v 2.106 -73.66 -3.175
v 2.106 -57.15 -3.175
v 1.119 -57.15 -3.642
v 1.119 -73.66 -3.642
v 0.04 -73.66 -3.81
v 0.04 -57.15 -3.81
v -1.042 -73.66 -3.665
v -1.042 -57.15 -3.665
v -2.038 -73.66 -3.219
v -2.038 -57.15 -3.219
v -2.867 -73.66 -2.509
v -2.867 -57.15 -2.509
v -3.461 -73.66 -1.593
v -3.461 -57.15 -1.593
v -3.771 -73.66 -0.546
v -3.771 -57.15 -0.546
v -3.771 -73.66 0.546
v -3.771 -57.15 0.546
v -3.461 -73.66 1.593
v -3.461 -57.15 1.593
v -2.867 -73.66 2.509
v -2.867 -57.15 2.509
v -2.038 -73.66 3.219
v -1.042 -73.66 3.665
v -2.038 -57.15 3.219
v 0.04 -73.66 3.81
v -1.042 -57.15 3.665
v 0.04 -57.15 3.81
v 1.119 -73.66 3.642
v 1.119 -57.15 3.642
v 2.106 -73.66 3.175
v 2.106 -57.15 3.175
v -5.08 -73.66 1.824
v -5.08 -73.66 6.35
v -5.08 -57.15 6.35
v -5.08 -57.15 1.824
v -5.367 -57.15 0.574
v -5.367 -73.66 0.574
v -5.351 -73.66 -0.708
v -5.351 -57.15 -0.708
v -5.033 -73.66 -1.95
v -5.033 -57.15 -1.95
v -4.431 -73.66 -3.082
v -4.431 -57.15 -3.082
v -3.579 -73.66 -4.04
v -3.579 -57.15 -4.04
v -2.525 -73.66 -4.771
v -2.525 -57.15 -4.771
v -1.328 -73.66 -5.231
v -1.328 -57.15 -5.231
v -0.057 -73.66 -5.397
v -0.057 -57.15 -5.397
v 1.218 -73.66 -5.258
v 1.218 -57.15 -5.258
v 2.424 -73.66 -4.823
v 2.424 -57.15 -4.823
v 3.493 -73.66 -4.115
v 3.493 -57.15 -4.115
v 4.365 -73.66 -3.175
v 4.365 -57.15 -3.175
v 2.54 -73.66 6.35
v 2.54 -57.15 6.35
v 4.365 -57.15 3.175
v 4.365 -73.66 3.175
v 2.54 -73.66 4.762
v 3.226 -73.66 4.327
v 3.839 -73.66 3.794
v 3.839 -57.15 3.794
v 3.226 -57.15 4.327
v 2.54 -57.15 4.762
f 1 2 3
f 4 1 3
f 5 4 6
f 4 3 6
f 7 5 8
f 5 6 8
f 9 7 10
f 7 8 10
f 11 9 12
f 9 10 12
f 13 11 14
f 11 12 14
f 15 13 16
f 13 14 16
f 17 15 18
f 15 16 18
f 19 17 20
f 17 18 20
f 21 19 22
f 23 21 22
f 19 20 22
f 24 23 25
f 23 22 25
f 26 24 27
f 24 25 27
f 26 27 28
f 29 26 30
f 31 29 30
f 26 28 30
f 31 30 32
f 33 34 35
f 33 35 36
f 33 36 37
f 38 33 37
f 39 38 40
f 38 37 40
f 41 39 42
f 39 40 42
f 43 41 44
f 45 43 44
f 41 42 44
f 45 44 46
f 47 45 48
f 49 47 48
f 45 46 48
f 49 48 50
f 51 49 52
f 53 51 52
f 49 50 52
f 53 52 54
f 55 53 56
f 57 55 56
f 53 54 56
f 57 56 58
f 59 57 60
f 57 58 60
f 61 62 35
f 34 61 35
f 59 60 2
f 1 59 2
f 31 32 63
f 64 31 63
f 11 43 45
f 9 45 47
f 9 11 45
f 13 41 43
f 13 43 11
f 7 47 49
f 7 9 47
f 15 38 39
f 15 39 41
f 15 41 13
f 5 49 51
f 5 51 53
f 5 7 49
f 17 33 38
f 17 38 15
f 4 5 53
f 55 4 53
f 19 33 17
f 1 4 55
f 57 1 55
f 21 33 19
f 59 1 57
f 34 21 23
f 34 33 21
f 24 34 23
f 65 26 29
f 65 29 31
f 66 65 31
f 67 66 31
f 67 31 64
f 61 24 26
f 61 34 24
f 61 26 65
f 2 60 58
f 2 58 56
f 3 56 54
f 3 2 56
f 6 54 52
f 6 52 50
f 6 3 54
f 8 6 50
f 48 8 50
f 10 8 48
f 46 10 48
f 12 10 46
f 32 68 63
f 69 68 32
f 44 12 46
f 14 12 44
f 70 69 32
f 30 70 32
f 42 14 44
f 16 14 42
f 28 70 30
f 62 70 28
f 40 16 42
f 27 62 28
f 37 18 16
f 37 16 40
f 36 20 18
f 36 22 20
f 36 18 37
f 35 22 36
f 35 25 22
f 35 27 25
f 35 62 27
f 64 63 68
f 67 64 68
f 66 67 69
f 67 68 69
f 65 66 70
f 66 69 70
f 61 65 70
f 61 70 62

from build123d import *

# Parameters (mm, degrees)
F1_DEPTH  = 73.66
F3_DEPTH  = 73.66
F4_W      = 25.4
F4_H      = 6.349999
F4_H_2    = 6.35
F5_DEPTH  = 69.85
F6_W      = 12.7
F6_H      = 63.5
F7_DEPTH  = 63.5
F8_W      = 25.4
F8_H      = 82.55
F9_DEPTH  = 57.15
F10_W     = 25.4
F10_H     = 6.349999
F11_DEPTH = 69.851


with BuildPart() as f1:
    # F0 (on Front) → F1 (new body)
    with BuildSketch(Plane.XZ):
        with BuildLine():
            ThreePointArc((2.106057, -3.175), (-3.81, 0), (2.106057, 3.175))
            Line((2.106057, 3.175), (4.364903, 3.175))
            ThreePointArc((4.364903, 3.175), (-5.3975, 0), (4.364903, -3.175))
            Line((4.364903, -3.175), (2.106057, -3.175))
        make_face()
    extrude(amount=F1_DEPTH)

    # F2 (on face) → F3 (join, through all)
    with BuildSketch(Plane.XZ.offset(73.66)):
        with BuildLine():
            Line((-5.08, 6.35), (-5.08, 1.823899))
            ThreePointArc((-5.08, 1.823899), (-1.942098, 5.035997), (2.54, 4.7625))
            Line((2.54, 4.7625), (2.54, 6.35))
            Line((2.54, 6.35), (-5.08, 6.35))
        make_face()
    extrude(amount=-F3_DEPTH)

    # F4 (on face) → F5 (join)
    with BuildSketch(Plane.XY.offset(6.35)):
        with Locations((-1.27, -65.405)):
            Rectangle(F4_W, F4_H)
        with Locations((-1.27, -8.255)):
            Rectangle(F4_W, F4_H_2)
    extrude(amount=F5_DEPTH)

    # F6 (on face) → F7 (cut, through all)
    with BuildSketch(Plane.XZ.offset(68.58)):
        with Locations((-1.27, 44.45)):
            Rectangle(F6_W, F6_H)
    extrude(amount=-F7_DEPTH, mode=Mode.SUBTRACT)

    # F8 (on face) → F9 (cut)
    with BuildSketch(Plane(origin=(0, 0, 0), x_dir=(-1, 0, 0), z_dir=(0, 1, 0))):
        with Locations((1.27, 34.925)):
            Rectangle(F8_W, F8_H)
    extrude(amount=-F9_DEPTH, mode=Mode.SUBTRACT)

    # F10 (on face) → F11 (cut, through all)
    with BuildSketch(Plane(origin=(0, 0, 6.35), x_dir=(1, 0, 0), z_dir=(0, 0, -1))):
        with Locations((-1.27, 65.405)):
            Rectangle(F10_W, F10_H)
    extrude(amount=-F11_DEPTH, mode=Mode.SUBTRACT)


solid = f1.part
